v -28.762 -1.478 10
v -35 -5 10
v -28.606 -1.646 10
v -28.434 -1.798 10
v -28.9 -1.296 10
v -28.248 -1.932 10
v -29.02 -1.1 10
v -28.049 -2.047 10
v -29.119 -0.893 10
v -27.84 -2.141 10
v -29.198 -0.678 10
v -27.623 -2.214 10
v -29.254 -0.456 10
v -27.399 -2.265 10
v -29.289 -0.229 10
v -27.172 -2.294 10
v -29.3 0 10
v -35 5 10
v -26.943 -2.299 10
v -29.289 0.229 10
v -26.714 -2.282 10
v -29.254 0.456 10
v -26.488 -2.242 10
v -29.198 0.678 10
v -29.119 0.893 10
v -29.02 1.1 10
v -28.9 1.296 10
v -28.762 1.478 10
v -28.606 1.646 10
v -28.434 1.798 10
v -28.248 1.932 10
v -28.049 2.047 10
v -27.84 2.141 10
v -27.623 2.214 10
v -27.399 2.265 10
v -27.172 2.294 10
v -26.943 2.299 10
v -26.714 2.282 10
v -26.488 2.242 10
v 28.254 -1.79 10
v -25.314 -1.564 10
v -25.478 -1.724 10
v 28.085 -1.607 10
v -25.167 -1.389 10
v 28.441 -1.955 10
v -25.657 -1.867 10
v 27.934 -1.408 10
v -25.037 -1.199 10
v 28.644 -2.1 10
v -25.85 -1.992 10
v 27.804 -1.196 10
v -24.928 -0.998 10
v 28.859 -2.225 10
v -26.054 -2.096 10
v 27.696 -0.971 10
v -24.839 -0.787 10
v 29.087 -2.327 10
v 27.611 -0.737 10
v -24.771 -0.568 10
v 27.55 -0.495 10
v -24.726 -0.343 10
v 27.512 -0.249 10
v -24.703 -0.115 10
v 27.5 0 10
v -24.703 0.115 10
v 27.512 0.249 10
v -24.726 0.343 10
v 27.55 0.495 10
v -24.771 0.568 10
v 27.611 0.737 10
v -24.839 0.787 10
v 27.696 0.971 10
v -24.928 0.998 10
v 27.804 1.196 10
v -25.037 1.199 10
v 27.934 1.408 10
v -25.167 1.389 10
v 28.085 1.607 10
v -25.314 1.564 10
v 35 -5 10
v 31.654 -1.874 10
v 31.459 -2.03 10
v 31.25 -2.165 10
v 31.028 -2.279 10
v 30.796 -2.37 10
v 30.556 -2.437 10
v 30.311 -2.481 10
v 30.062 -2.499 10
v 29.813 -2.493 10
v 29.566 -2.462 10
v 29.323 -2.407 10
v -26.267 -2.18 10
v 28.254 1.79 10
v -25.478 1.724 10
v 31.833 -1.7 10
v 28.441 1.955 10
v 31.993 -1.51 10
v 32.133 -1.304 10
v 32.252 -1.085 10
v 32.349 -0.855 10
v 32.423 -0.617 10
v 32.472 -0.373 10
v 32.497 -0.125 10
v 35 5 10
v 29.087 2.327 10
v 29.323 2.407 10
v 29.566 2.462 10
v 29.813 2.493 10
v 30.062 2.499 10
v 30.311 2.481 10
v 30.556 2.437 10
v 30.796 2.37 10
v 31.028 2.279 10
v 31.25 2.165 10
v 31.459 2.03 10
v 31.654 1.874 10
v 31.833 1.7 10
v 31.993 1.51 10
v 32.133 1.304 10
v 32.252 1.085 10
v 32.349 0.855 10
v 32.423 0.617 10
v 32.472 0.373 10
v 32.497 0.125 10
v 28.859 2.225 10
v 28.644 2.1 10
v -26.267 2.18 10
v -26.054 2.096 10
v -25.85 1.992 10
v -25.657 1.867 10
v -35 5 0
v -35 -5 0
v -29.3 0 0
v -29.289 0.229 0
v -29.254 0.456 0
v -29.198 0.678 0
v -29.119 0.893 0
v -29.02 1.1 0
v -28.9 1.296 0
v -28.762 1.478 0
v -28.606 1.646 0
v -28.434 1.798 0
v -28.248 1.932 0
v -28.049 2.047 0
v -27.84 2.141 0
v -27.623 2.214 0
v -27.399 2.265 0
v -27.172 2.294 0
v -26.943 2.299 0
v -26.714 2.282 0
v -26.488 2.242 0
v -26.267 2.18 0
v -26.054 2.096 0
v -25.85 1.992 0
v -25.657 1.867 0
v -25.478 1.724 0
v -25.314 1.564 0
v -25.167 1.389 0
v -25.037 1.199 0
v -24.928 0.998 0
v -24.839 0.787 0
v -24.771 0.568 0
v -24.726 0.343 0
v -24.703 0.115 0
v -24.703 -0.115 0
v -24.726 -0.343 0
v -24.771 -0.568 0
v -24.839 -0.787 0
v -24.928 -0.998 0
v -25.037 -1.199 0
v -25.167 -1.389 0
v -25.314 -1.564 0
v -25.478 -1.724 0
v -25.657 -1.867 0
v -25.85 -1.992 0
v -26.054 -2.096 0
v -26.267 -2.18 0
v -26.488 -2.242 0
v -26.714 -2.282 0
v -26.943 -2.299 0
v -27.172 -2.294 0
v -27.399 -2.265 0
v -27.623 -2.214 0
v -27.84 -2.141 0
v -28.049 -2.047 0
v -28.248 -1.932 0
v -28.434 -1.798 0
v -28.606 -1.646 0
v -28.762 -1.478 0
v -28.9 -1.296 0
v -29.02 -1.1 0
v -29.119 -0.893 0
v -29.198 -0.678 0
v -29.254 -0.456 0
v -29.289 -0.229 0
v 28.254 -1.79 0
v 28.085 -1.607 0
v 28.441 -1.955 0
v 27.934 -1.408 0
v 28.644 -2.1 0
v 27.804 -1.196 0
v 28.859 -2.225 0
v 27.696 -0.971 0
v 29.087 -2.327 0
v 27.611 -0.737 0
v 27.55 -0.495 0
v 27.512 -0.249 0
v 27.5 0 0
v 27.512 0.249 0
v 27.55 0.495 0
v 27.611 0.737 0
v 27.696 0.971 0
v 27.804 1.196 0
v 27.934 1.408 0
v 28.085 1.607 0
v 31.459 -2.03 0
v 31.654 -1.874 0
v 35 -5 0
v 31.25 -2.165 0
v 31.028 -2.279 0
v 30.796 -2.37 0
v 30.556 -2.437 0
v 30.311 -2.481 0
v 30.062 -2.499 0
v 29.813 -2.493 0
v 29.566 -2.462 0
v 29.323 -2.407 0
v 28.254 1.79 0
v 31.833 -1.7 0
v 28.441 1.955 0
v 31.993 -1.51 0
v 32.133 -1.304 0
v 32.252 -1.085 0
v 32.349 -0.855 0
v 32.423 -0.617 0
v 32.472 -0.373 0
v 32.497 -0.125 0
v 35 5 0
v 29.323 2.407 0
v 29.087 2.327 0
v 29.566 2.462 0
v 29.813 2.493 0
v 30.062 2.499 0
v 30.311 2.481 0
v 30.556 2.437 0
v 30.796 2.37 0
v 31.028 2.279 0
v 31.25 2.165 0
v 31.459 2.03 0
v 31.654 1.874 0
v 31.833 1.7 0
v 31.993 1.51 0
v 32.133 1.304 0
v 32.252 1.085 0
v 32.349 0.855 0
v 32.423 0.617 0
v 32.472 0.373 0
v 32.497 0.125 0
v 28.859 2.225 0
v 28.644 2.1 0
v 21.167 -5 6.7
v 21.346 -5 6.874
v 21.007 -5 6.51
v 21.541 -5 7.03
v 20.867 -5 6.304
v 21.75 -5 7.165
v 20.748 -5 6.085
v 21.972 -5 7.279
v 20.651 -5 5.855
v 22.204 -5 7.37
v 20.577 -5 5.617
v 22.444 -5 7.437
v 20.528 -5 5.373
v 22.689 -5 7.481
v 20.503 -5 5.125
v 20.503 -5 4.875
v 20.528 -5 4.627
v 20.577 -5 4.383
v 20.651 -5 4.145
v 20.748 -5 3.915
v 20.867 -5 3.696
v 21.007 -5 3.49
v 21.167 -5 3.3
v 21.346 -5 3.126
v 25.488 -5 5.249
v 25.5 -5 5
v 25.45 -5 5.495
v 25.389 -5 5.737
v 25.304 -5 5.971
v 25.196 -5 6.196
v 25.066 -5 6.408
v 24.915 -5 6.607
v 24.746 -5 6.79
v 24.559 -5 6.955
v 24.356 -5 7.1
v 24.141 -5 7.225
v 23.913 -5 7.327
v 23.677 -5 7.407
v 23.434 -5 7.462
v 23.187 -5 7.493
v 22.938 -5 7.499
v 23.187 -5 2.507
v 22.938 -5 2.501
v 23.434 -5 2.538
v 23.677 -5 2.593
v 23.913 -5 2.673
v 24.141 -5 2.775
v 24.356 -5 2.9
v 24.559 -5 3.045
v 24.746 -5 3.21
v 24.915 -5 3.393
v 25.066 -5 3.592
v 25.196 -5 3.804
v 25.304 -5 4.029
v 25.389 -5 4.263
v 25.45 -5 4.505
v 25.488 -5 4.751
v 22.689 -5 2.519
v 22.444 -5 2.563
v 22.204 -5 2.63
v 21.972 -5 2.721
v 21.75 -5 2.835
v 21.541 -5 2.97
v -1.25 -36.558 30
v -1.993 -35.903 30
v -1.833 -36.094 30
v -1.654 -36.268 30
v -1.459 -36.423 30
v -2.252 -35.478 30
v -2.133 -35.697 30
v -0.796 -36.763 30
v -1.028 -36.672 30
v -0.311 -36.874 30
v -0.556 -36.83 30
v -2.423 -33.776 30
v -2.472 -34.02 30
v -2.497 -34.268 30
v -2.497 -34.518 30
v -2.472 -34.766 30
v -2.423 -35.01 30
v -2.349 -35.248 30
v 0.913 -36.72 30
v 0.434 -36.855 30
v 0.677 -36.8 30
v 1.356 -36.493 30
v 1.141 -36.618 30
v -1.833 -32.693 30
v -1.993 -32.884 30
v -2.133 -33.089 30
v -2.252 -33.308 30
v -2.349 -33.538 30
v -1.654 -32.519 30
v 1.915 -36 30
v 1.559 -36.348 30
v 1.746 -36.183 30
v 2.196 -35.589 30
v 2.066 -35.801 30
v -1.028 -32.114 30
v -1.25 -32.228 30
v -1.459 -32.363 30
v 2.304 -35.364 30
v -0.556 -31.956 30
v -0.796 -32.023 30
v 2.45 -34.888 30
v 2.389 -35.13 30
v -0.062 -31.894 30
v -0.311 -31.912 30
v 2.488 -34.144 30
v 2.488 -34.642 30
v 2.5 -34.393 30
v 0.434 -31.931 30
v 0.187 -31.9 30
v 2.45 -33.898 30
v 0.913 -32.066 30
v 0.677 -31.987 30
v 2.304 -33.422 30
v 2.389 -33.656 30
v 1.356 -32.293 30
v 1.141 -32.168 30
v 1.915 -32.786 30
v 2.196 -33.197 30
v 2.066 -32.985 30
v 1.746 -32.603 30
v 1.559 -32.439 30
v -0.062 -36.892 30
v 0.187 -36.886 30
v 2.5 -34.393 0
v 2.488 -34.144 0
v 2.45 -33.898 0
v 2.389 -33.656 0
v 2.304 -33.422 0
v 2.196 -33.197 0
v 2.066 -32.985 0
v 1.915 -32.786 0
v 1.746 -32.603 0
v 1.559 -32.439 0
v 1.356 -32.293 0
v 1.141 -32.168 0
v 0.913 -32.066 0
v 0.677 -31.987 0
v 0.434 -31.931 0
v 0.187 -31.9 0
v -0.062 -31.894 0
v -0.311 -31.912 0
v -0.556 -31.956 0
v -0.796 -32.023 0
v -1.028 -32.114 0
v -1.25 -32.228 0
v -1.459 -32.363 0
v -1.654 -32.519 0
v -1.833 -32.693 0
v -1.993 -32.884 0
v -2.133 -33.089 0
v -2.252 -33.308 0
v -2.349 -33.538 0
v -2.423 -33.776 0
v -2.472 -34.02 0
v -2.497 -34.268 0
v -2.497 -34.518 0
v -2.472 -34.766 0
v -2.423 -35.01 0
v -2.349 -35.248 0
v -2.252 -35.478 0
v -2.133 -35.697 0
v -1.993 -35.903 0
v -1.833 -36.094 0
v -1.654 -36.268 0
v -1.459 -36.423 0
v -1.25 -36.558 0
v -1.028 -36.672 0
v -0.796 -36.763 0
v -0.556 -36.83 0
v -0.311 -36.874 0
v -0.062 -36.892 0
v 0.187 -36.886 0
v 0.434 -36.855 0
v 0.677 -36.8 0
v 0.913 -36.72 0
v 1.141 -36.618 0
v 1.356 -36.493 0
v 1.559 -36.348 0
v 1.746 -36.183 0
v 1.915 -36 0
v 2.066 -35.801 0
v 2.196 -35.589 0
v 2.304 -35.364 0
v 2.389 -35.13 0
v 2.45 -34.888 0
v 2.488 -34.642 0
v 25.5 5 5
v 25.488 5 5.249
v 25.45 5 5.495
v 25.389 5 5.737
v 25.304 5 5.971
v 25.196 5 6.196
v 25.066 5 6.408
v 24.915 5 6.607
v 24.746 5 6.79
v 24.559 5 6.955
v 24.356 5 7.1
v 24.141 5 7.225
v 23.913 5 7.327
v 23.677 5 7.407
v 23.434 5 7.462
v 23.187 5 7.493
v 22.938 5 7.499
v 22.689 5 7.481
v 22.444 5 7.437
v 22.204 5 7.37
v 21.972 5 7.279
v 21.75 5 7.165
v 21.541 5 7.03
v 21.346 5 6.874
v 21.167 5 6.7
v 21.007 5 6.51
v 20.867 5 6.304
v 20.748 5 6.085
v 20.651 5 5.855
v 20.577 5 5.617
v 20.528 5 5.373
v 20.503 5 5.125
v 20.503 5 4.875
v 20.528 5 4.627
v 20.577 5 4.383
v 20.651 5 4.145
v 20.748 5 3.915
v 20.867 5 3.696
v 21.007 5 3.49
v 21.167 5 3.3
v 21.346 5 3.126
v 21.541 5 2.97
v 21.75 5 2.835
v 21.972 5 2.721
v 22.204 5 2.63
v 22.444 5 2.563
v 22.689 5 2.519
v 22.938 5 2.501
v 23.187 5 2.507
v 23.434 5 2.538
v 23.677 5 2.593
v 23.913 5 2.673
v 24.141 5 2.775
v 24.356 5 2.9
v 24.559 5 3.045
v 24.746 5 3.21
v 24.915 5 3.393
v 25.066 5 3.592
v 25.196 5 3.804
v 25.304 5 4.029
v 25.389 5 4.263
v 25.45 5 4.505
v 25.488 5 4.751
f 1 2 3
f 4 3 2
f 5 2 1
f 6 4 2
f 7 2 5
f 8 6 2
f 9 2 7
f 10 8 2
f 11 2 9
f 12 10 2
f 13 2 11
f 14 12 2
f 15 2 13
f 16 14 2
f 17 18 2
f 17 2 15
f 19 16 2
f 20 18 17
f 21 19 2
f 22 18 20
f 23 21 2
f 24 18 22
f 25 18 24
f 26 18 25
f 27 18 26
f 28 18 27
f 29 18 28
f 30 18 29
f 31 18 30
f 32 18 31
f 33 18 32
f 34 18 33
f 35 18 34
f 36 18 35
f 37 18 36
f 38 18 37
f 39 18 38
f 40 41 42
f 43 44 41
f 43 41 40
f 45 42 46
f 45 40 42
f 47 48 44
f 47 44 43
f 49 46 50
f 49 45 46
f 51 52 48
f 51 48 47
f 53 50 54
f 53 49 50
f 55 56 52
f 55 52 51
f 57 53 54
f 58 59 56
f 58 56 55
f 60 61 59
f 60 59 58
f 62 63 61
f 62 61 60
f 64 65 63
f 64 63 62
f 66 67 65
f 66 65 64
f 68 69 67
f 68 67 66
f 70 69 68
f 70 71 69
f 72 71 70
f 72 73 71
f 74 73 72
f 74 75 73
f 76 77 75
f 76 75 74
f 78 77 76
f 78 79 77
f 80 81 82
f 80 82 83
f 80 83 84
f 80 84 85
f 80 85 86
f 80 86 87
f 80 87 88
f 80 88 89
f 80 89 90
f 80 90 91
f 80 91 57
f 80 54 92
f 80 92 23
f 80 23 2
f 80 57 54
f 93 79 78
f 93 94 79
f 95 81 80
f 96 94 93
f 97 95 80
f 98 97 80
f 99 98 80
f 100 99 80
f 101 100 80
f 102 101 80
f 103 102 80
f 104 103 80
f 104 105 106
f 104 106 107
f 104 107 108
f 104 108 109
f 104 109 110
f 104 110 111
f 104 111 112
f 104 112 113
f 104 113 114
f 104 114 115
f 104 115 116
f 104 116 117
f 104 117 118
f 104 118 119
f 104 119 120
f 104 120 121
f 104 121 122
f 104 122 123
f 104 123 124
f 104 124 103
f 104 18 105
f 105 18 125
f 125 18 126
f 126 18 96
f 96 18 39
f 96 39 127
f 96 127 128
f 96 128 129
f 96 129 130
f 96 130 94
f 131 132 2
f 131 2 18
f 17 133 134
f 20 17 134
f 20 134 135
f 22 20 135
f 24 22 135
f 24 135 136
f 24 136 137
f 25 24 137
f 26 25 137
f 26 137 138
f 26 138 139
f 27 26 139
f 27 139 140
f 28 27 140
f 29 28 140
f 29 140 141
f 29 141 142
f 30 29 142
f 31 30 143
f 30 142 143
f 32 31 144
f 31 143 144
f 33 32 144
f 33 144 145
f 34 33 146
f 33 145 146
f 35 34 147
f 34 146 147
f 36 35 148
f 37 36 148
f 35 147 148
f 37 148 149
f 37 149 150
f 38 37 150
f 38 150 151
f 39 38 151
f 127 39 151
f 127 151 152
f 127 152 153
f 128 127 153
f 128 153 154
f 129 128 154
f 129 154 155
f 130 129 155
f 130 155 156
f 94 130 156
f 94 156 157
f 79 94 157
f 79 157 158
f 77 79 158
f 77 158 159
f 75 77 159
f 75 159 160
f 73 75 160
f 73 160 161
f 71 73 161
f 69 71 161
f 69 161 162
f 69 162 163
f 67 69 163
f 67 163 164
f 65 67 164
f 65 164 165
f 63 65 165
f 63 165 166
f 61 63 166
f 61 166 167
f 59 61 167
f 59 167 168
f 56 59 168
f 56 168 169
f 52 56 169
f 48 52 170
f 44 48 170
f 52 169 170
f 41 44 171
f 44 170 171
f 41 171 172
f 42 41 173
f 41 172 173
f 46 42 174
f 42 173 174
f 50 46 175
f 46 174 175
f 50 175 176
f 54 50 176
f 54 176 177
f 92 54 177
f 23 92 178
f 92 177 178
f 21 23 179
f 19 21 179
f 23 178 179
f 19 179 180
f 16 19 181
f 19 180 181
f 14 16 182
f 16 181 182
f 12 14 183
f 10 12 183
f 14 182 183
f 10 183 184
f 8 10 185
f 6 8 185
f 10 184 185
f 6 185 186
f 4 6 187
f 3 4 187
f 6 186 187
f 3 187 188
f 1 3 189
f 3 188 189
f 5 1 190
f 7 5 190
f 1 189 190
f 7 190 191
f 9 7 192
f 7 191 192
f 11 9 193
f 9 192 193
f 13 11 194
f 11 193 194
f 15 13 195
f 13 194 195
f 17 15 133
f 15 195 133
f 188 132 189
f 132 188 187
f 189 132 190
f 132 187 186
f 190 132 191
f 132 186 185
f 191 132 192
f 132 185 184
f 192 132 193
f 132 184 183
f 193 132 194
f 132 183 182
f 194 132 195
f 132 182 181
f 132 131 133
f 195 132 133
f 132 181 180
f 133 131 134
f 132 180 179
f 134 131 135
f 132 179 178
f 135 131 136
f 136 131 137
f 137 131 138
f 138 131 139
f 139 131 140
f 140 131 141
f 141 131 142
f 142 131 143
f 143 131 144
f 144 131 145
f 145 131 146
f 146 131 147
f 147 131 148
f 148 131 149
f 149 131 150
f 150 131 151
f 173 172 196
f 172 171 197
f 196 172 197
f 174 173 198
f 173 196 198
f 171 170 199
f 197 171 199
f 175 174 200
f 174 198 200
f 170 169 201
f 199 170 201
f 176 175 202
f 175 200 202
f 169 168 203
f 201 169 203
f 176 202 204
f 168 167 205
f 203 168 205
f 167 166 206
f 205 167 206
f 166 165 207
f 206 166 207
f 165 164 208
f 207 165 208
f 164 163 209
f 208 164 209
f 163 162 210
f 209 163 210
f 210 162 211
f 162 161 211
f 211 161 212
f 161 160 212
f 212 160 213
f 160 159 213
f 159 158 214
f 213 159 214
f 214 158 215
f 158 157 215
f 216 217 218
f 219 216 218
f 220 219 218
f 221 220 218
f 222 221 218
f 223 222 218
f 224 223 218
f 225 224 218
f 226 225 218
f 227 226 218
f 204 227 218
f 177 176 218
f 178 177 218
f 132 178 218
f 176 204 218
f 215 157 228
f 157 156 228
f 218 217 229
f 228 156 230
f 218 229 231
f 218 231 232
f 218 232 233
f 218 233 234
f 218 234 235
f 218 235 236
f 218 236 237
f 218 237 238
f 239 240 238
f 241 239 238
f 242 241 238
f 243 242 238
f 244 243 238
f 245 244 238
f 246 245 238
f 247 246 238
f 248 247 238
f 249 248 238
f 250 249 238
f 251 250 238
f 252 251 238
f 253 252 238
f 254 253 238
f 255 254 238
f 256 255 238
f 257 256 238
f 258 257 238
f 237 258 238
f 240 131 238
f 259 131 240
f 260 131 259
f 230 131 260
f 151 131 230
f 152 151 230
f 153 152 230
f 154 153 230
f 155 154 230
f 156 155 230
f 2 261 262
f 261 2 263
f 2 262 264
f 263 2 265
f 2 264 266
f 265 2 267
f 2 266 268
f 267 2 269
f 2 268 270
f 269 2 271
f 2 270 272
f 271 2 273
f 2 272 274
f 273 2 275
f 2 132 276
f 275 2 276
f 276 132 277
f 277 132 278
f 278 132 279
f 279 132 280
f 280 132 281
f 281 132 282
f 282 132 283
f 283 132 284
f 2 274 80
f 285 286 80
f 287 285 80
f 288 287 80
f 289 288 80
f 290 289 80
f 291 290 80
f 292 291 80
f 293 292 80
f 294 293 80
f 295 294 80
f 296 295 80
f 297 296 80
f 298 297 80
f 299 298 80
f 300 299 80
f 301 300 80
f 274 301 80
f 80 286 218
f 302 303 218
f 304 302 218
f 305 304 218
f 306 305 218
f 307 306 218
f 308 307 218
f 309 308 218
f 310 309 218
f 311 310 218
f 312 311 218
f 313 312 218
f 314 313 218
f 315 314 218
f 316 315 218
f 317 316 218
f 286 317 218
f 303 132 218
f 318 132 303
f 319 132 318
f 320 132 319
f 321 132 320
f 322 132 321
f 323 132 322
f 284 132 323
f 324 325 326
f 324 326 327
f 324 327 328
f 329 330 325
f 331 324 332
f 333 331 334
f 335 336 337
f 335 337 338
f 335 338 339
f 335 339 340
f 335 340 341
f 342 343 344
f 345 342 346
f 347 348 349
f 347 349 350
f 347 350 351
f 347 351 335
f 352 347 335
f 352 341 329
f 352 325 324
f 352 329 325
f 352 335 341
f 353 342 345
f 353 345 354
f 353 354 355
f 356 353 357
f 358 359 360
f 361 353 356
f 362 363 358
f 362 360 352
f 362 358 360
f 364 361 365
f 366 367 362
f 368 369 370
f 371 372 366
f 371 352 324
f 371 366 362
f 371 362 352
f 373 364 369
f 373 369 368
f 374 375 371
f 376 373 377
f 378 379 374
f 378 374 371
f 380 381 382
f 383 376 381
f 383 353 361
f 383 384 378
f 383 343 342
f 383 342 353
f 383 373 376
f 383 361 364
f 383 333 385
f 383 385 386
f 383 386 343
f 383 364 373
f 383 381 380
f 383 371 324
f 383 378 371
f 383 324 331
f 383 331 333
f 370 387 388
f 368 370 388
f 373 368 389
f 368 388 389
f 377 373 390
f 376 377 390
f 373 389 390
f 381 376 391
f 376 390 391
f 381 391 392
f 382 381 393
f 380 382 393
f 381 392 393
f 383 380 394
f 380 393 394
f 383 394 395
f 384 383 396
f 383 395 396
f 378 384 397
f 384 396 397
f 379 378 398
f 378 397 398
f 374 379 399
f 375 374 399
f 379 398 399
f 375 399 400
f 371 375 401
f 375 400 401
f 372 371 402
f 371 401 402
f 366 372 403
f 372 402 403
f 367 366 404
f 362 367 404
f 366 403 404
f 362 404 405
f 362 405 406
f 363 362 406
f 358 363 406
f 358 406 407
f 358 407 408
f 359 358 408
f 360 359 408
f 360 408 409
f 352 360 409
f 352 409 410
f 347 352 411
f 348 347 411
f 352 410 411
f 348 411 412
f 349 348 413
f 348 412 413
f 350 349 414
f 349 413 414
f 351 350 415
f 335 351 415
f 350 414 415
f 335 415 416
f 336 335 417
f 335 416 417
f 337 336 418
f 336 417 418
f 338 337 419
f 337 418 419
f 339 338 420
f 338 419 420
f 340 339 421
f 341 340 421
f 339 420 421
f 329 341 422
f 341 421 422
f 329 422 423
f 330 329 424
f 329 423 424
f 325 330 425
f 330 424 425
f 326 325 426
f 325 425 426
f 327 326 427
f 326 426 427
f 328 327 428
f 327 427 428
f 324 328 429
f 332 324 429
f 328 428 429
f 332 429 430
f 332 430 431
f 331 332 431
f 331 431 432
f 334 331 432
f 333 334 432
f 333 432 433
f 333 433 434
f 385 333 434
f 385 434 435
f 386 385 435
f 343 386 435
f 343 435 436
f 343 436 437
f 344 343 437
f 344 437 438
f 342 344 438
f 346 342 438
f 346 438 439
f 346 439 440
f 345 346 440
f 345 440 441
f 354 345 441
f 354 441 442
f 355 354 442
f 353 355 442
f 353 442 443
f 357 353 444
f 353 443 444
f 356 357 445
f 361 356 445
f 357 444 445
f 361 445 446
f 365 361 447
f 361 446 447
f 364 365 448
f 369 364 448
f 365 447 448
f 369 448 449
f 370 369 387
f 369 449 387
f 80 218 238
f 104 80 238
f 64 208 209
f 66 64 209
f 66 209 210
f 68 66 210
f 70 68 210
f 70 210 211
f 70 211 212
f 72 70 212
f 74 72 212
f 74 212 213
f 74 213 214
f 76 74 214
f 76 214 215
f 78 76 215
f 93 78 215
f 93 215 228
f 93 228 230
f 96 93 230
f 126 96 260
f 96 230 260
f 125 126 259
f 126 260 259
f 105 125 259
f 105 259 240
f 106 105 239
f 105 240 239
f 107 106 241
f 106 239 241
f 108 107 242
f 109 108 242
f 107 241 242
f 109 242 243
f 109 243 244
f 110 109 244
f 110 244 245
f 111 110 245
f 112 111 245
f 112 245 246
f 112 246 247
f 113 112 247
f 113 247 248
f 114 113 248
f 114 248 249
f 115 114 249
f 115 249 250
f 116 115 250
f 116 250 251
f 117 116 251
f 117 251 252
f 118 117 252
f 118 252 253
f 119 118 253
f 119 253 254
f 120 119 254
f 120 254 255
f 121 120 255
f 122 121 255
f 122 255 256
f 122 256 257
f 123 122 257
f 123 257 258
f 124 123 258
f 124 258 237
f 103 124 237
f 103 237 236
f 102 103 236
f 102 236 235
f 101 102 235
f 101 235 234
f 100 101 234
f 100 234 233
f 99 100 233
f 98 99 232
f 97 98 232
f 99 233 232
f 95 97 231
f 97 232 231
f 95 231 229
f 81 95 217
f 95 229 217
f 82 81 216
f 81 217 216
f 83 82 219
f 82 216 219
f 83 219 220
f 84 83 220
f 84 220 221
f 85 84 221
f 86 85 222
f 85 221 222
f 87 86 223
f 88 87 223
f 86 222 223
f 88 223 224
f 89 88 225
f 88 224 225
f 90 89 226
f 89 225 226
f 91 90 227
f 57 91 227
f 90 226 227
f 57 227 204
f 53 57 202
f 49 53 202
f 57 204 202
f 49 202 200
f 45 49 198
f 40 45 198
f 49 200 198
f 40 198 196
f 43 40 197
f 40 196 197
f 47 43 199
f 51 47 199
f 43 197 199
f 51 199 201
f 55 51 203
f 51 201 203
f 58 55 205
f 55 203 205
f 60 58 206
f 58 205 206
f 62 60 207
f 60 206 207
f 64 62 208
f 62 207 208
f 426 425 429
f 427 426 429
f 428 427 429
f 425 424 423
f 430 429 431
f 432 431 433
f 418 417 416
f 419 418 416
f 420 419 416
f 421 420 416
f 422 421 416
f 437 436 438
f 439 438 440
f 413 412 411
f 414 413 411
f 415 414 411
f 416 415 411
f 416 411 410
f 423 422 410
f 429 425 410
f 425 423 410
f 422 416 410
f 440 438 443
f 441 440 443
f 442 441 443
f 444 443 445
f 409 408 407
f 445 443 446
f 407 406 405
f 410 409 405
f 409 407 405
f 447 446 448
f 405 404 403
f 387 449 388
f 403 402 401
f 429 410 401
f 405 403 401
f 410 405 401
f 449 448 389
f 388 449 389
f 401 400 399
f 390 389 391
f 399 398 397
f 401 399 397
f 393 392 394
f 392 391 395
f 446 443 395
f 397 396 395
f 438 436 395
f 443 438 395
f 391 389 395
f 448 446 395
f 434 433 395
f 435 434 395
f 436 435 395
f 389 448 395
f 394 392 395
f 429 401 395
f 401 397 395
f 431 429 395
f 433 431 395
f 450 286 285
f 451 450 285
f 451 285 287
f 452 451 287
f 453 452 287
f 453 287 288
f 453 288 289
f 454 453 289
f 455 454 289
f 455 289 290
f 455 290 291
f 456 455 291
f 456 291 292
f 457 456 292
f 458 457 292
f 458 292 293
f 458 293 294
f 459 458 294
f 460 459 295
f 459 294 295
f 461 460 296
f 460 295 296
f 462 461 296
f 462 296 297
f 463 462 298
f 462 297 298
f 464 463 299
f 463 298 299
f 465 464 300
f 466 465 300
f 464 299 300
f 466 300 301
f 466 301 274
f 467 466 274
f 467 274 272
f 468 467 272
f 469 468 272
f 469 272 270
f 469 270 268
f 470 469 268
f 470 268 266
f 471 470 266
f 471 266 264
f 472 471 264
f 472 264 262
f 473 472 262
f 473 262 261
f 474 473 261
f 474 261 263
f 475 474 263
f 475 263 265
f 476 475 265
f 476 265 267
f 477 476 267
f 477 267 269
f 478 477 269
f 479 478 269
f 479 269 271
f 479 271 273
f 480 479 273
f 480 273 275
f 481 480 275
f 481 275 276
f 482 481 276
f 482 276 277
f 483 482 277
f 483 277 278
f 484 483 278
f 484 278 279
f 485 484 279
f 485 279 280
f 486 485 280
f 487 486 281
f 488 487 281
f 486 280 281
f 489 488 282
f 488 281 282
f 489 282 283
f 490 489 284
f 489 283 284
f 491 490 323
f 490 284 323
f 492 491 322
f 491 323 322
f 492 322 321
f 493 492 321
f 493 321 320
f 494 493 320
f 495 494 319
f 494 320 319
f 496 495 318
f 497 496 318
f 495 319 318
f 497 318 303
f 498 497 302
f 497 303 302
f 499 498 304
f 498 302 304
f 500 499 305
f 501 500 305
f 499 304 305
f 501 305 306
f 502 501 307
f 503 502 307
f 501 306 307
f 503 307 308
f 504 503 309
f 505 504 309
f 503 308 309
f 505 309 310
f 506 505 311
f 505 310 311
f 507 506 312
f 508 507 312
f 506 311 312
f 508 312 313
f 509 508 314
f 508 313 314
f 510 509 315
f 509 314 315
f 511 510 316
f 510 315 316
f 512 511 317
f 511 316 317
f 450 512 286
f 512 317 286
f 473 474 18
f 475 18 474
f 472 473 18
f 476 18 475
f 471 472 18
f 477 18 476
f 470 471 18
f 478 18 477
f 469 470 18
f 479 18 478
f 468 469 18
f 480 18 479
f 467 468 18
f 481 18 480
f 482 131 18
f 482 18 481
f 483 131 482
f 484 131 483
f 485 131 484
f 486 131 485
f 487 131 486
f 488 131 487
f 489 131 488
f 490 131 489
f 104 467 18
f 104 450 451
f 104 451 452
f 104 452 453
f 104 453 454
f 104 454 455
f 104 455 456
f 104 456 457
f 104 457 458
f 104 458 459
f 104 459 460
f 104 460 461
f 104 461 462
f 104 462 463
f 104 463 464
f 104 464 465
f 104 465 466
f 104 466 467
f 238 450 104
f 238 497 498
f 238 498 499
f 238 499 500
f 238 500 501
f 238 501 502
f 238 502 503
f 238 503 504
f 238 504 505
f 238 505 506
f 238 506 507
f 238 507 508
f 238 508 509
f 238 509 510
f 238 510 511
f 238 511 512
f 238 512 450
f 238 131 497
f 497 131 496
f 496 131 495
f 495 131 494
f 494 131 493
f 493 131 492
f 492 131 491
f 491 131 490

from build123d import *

# Parameters (mm, degrees)
F0_W     = 70
F0_H     = 10
F1_DEPTH = 10
F2_R     = 2.5
F3_DEPTH = 25
F5_D     = 5
F6_D     = 4.6
F7_R     = 2.5
F8_DEPTH = 30


with BuildPart() as f1:
    # F0 (on Top) → F1 (new body)
    with BuildSketch(Plane.XY):
        Rectangle(F0_W, F0_H)
    extrude(amount=F1_DEPTH)

    # F2 (on face) → F3 (cut)
    with BuildSketch(Plane.XZ.offset(5)):
        with Locations((23, 5)):
            Circle(F2_R)
    extrude(amount=-F3_DEPTH, mode=Mode.SUBTRACT)

    # F5 (through all)
    with Locations(Plane.XY.offset(10)):
        with Locations((30, 0)):
            Hole(F5_D / 2)

    # F6 (through all)
    with Locations(Plane.XY.offset(10)):
        with Locations((-27, 0)):
            Hole(F6_D / 2)


with BuildPart() as f8:
    # F7 (on Top) → F8 (new body)
    with BuildSketch(Plane.XY):
        with Locations((0, -34.3930833042)):
            Circle(F7_R)
    extrude(amount=F8_DEPTH)


solid = Compound([f1.part, f8.part])
